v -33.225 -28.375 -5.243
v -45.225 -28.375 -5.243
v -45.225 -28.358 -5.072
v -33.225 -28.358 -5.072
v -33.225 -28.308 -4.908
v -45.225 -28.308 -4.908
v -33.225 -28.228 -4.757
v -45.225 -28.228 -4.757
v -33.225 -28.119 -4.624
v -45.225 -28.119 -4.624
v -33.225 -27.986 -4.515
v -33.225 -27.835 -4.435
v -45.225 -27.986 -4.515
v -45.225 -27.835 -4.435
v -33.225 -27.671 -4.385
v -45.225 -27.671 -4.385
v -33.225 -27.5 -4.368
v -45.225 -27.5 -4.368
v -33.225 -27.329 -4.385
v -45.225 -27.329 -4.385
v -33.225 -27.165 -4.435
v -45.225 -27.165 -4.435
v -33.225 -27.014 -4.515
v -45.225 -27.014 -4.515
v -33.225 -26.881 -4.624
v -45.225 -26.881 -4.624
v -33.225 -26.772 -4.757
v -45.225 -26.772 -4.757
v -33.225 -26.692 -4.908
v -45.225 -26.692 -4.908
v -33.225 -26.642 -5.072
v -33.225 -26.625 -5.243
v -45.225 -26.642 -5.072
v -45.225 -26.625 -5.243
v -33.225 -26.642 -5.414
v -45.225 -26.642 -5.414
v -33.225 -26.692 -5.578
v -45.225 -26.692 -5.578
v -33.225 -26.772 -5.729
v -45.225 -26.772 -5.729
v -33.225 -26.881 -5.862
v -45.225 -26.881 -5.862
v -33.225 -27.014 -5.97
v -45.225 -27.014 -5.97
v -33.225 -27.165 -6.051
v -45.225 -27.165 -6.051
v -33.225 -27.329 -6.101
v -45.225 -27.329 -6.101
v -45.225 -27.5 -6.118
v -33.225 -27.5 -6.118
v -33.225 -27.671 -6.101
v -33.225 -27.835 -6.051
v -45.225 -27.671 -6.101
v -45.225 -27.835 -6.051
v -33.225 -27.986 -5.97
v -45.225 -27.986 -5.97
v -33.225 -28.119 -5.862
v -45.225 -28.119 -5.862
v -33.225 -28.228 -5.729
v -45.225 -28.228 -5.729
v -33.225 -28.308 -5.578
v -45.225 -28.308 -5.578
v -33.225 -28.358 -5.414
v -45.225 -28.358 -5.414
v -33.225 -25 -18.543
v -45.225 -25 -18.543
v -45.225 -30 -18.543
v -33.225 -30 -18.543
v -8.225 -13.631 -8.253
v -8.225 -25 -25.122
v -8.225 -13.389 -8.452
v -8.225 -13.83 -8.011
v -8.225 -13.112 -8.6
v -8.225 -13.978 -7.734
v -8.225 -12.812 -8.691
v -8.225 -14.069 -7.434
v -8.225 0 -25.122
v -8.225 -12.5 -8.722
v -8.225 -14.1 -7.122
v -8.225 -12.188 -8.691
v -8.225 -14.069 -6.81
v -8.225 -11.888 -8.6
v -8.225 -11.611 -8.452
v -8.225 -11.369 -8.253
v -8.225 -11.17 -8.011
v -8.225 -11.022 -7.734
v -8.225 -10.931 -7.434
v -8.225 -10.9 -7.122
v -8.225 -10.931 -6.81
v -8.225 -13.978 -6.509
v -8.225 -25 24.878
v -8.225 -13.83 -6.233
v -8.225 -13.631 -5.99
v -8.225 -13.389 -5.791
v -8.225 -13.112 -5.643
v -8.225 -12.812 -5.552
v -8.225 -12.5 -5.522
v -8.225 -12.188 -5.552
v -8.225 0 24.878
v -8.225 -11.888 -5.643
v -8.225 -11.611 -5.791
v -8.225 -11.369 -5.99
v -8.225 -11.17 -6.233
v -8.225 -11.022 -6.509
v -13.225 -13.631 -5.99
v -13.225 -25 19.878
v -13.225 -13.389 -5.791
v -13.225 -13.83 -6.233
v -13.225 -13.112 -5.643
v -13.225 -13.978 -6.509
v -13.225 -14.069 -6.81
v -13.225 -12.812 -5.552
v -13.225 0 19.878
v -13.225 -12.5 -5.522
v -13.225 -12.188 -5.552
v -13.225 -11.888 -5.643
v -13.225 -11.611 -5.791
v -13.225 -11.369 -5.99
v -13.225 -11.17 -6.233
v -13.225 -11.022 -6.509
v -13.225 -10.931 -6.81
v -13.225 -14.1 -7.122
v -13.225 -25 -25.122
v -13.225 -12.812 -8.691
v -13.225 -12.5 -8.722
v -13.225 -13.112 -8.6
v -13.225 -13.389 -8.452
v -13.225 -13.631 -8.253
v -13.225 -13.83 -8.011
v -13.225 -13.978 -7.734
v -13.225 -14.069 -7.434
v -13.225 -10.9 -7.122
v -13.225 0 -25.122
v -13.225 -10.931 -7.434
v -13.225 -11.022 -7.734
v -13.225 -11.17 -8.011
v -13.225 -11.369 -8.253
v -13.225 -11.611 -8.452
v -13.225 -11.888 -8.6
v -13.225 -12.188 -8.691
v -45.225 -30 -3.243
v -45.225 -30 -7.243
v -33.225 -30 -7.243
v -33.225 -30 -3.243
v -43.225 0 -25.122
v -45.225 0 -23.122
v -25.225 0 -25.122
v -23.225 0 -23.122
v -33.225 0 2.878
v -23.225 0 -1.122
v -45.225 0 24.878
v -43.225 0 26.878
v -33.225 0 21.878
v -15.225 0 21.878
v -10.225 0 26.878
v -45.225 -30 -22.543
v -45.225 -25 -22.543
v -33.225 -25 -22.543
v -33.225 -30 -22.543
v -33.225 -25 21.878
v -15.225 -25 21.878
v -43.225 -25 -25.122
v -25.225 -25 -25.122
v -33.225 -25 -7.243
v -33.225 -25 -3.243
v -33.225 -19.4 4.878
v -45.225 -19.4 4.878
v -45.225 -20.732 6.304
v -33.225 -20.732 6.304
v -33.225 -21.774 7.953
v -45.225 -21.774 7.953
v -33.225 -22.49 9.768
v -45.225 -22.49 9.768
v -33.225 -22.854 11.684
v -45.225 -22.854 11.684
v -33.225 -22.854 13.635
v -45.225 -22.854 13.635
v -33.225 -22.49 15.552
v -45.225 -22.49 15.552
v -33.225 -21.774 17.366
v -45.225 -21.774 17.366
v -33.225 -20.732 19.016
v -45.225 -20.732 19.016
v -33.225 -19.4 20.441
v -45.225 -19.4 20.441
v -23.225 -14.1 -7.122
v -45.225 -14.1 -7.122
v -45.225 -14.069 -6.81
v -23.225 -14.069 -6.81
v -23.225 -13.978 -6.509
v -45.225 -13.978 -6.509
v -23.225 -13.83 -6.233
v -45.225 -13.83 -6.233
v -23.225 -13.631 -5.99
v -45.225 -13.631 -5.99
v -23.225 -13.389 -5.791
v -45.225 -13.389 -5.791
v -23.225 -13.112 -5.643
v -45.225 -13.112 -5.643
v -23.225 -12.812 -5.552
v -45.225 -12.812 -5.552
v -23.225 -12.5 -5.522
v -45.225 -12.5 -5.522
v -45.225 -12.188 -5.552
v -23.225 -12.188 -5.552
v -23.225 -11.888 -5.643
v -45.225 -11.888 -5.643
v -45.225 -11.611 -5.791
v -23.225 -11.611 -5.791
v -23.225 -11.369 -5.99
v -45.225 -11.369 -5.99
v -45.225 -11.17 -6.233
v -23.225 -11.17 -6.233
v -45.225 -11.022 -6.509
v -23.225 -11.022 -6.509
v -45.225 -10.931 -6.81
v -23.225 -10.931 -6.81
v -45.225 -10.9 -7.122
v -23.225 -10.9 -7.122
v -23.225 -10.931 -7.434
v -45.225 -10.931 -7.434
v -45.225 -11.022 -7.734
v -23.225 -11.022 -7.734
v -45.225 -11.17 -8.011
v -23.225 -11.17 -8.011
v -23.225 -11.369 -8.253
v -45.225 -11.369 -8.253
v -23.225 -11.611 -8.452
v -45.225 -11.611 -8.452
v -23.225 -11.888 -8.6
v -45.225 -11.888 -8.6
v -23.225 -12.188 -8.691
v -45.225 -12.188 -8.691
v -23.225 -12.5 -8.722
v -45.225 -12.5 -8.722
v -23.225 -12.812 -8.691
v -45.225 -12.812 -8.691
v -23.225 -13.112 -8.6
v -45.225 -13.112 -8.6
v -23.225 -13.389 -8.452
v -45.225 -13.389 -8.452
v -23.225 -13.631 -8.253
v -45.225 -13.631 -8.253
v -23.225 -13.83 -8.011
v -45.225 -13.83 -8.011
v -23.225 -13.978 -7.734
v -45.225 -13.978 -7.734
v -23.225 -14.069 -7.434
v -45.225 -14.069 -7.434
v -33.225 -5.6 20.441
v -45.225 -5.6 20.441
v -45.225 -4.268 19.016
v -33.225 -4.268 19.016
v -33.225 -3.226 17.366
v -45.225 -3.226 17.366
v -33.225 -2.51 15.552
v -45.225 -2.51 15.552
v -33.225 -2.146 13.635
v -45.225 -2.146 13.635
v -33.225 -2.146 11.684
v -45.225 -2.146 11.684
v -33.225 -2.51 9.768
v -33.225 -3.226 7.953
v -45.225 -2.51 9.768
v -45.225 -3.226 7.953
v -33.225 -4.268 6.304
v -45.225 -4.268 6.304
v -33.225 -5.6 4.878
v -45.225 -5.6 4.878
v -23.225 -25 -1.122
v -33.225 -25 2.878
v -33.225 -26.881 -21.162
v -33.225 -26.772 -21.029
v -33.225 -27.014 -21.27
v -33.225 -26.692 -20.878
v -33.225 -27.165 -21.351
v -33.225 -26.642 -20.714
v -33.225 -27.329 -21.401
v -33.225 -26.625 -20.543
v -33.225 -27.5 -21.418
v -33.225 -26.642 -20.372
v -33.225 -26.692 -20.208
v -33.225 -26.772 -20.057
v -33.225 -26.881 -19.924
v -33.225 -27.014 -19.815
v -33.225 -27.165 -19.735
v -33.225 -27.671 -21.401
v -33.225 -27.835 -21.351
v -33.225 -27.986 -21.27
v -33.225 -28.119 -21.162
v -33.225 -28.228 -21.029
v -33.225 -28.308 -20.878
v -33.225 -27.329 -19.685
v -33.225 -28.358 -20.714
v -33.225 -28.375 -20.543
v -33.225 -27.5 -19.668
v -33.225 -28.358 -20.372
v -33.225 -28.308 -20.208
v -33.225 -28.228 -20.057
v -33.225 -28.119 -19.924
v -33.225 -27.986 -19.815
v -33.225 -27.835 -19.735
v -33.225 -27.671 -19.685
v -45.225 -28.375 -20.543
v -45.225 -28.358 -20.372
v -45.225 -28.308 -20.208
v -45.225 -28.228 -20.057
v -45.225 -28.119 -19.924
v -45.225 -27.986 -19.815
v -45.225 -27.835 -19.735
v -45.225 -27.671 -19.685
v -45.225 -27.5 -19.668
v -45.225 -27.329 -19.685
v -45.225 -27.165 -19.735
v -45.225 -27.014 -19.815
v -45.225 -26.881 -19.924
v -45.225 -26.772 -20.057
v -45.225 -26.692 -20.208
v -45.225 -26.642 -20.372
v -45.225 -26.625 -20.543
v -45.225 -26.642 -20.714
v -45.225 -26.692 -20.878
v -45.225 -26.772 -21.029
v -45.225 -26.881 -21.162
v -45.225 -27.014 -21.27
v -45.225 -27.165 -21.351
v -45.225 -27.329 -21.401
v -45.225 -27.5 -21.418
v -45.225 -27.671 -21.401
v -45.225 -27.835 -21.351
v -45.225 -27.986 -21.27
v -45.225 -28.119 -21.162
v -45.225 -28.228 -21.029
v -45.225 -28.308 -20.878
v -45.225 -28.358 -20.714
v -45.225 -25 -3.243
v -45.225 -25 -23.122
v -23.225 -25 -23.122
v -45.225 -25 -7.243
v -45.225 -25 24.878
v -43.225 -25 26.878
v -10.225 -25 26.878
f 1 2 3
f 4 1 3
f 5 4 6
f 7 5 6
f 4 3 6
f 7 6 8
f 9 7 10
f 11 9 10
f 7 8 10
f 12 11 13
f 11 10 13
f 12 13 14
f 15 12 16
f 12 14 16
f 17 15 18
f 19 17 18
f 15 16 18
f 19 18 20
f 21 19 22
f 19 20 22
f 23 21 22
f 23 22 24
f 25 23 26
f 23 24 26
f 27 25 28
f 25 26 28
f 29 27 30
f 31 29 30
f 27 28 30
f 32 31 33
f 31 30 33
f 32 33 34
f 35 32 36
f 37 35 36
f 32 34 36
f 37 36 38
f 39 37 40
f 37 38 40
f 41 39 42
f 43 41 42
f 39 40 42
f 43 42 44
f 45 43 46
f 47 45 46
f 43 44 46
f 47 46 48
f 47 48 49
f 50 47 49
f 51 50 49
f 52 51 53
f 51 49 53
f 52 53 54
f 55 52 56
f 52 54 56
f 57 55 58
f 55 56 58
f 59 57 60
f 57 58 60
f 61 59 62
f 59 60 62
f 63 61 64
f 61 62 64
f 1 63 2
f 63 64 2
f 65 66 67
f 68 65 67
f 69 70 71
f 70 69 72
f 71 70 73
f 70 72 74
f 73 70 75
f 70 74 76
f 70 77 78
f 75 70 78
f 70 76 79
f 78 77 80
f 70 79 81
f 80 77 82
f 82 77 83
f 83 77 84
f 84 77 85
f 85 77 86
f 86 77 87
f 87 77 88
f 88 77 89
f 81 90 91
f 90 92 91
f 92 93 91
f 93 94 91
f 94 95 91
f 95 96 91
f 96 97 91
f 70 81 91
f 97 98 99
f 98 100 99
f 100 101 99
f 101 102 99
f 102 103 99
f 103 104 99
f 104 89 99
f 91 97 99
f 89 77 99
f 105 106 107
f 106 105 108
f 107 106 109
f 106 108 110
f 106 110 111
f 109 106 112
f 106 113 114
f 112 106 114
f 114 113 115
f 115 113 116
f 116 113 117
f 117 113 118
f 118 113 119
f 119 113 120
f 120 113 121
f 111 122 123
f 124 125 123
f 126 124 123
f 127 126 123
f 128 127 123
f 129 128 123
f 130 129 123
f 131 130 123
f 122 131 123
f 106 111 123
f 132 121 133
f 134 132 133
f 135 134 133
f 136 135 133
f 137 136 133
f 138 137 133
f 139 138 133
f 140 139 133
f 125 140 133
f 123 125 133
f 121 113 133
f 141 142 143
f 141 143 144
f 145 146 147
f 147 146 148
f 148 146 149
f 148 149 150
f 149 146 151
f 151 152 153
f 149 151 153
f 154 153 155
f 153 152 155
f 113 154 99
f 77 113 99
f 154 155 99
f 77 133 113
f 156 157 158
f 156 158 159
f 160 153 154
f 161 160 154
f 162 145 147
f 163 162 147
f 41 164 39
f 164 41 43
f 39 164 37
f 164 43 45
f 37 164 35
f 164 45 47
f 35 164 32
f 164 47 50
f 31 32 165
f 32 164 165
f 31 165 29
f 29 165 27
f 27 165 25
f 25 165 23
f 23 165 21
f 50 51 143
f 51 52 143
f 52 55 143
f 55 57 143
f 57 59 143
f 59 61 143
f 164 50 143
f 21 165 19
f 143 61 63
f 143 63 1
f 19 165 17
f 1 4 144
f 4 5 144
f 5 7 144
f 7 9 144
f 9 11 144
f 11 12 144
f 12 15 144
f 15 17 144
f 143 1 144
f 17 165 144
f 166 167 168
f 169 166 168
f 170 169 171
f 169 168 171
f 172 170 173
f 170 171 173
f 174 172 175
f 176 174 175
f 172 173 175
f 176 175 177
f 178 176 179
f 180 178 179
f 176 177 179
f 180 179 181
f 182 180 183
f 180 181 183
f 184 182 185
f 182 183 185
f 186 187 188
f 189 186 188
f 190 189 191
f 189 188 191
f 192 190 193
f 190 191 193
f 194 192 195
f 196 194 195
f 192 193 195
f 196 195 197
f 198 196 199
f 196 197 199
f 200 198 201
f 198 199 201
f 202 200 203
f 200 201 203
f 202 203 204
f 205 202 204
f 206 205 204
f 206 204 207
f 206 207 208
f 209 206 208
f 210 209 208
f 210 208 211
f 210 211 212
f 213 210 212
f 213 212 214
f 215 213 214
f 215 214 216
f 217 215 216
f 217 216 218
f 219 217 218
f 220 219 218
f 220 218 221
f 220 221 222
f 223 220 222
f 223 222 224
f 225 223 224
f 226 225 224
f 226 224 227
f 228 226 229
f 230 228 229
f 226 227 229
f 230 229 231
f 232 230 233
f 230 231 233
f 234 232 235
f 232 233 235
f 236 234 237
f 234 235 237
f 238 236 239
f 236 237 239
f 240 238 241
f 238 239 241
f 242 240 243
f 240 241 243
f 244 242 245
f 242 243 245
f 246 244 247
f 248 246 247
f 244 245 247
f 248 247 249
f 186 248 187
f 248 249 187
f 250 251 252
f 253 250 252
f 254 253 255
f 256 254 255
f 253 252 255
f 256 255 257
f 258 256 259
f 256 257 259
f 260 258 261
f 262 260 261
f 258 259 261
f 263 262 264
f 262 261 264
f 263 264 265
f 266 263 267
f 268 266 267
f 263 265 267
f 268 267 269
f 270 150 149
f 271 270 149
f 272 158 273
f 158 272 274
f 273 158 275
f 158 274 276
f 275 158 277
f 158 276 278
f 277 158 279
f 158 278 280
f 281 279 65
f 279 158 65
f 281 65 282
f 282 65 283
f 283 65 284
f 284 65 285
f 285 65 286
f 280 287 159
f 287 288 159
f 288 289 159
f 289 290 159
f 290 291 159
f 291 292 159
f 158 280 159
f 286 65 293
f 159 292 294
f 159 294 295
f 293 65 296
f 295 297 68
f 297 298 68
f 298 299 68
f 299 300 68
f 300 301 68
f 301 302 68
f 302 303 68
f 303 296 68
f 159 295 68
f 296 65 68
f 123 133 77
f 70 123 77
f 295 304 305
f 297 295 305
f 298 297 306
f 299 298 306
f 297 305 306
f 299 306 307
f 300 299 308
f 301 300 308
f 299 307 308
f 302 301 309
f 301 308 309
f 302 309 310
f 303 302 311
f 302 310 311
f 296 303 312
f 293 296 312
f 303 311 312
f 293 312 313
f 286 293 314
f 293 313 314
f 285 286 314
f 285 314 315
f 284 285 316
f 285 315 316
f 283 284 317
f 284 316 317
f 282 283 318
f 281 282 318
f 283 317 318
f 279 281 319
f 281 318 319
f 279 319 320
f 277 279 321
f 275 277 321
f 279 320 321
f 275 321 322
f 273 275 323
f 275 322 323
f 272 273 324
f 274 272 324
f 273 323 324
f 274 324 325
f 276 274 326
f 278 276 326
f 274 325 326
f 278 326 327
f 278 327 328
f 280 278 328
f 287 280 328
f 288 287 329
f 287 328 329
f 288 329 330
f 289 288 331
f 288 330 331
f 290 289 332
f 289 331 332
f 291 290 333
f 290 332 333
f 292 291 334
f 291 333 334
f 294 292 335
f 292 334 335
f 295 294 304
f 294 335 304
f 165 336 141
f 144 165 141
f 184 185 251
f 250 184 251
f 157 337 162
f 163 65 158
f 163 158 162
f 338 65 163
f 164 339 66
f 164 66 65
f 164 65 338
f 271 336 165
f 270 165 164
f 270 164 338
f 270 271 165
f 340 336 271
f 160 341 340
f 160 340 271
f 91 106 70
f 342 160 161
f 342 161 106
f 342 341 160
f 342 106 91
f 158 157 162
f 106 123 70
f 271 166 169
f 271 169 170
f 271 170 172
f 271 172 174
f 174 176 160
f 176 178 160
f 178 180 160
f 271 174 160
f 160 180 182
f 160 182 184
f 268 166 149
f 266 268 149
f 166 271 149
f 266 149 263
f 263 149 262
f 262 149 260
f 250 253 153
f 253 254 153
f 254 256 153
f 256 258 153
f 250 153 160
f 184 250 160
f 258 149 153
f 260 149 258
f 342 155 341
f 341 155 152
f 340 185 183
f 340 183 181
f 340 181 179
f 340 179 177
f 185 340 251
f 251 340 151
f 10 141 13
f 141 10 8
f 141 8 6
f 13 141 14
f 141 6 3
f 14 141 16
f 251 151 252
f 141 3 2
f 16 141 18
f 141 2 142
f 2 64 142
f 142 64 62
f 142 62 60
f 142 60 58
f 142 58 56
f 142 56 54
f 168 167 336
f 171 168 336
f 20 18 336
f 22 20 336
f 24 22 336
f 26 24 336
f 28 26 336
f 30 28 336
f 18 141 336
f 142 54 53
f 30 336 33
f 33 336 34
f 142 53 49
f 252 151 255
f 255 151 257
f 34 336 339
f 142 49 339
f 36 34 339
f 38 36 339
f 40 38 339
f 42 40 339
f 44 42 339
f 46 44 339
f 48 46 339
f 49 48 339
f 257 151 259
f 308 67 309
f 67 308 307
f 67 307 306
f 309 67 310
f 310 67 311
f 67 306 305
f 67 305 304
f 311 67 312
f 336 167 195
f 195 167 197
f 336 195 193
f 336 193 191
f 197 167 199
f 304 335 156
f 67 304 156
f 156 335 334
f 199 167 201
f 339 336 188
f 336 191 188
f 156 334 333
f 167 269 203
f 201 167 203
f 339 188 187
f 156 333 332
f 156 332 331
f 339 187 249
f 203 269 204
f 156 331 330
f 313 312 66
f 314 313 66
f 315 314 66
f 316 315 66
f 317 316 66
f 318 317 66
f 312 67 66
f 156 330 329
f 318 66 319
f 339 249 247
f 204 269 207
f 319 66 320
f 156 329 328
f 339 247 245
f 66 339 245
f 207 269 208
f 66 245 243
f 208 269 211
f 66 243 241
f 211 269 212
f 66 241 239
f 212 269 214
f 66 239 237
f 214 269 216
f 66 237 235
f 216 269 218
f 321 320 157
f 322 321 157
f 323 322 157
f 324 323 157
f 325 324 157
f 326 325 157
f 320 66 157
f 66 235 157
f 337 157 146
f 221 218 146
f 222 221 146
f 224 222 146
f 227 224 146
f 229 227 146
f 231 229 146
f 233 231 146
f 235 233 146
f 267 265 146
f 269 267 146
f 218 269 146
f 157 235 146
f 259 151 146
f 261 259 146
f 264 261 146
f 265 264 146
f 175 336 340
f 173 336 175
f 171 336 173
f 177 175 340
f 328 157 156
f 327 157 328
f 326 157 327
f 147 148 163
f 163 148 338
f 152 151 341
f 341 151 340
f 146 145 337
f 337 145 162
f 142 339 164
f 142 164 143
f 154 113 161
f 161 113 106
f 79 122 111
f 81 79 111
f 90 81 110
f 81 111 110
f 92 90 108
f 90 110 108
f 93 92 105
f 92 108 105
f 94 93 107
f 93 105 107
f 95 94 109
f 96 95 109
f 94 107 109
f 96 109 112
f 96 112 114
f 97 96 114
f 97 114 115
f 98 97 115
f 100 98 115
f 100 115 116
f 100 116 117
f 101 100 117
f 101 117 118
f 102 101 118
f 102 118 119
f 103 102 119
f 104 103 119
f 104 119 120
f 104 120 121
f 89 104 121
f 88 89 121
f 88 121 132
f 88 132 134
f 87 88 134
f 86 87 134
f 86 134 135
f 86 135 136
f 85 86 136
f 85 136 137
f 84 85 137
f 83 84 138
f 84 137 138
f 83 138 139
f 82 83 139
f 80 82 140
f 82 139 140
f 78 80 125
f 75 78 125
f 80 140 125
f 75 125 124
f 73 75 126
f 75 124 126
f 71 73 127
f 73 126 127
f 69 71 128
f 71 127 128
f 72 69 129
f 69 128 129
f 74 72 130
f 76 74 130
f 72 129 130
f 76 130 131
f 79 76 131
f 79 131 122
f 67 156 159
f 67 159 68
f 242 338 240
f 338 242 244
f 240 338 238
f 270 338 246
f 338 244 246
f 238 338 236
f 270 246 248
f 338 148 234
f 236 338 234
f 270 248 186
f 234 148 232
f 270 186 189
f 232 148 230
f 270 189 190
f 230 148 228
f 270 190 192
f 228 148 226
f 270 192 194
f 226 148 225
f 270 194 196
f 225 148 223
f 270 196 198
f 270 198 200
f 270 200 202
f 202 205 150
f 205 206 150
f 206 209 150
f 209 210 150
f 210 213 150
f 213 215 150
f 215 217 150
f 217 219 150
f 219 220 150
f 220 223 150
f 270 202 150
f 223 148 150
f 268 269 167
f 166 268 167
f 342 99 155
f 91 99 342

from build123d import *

# Parameters (mm, degrees)
F1_DEPTH = 25
F3_DEPTH = 25
F4_R     = 1.6
F5_DEPTH = 37.001
F6_SIZE  = 2
F7_W     = 5
F7_H     = 4
F7_R     = 0.875
F8_DEPTH = 12


with BuildPart() as f1:
    # F0 (on Front) → F1 (new body)
    with BuildSketch(Plane.XZ):
        Polygon((-8.225309, 26.877944), (-45.225309, 26.877944), (-45.225309, -25.122056), (-23.225309, -25.122056), (-23.225309, -1.122056), (-33.225309, 2.877944), (-33.225309, 21.877944), (-13.225309, 21.877944), (-13.225309, -25.122056), (-8.225309, -25.122056), align=None)
    extrude(amount=F1_DEPTH)

    # F2 (on face) → F3 (cut)
    with BuildSketch(Plane(origin=(-45.225309, 0, 0), x_dir=(0, -1, 0), z_dir=(-1, 0, 0))):
        with BuildLine():
            Line((19.4, 20.441103), (5.6, 20.441103))
            ThreePointArc((5.6, 20.441103), (2.1, 12.659715), (5.6, 4.878327))
            Line((5.6, 4.878327), (19.4, 4.878327))
            ThreePointArc((19.4, 4.878327), (22.9, 12.659715), (19.4, 20.441103))
        make_face()
    extrude(amount=-F3_DEPTH, mode=Mode.SUBTRACT)

    # F4 (on face) → F5 (cut, through all)
    with BuildSketch(Plane(origin=(-45.225309, 0, 0), x_dir=(0, -1, 0), z_dir=(-1, 0, 0))):
        with Locations((12.5, -7.121673)):
            Circle(F4_R)
    extrude(amount=-F5_DEPTH, mode=Mode.SUBTRACT)

    # F6
    f6_edges = [f1.edges().sort_by_distance(p)[0] for p in [
        (-45.225309, -12.5, -25.122056),
        (-23.225309, -12.5, -25.122056),
        (-13.225309, -12.5, 21.877944),
        (-8.225309, -12.5, 26.877944),
        (-45.225309, -12.5, 26.877944),
    ]]
    chamfer(f6_edges, length=F6_SIZE)

    # F7 (on face) → F8 (join, through all)
    with BuildSketch(Plane(origin=(-45.225309, 0, 0), x_dir=(0, -1, 0), z_dir=(-1, 0, 0))):
        with Locations((27.5, -20.542917)):
            Rectangle(F7_W, F7_H)
        with Locations((27.5, -20.542917)):
            Circle(F7_R, mode=Mode.SUBTRACT)
        with Locations((27.5, -5.242917)):
            Rectangle(F7_W, F7_H)
        with Locations((27.5, -5.242917)):
            Circle(F7_R, mode=Mode.SUBTRACT)
    extrude(amount=-F8_DEPTH)


solid = f1.part
